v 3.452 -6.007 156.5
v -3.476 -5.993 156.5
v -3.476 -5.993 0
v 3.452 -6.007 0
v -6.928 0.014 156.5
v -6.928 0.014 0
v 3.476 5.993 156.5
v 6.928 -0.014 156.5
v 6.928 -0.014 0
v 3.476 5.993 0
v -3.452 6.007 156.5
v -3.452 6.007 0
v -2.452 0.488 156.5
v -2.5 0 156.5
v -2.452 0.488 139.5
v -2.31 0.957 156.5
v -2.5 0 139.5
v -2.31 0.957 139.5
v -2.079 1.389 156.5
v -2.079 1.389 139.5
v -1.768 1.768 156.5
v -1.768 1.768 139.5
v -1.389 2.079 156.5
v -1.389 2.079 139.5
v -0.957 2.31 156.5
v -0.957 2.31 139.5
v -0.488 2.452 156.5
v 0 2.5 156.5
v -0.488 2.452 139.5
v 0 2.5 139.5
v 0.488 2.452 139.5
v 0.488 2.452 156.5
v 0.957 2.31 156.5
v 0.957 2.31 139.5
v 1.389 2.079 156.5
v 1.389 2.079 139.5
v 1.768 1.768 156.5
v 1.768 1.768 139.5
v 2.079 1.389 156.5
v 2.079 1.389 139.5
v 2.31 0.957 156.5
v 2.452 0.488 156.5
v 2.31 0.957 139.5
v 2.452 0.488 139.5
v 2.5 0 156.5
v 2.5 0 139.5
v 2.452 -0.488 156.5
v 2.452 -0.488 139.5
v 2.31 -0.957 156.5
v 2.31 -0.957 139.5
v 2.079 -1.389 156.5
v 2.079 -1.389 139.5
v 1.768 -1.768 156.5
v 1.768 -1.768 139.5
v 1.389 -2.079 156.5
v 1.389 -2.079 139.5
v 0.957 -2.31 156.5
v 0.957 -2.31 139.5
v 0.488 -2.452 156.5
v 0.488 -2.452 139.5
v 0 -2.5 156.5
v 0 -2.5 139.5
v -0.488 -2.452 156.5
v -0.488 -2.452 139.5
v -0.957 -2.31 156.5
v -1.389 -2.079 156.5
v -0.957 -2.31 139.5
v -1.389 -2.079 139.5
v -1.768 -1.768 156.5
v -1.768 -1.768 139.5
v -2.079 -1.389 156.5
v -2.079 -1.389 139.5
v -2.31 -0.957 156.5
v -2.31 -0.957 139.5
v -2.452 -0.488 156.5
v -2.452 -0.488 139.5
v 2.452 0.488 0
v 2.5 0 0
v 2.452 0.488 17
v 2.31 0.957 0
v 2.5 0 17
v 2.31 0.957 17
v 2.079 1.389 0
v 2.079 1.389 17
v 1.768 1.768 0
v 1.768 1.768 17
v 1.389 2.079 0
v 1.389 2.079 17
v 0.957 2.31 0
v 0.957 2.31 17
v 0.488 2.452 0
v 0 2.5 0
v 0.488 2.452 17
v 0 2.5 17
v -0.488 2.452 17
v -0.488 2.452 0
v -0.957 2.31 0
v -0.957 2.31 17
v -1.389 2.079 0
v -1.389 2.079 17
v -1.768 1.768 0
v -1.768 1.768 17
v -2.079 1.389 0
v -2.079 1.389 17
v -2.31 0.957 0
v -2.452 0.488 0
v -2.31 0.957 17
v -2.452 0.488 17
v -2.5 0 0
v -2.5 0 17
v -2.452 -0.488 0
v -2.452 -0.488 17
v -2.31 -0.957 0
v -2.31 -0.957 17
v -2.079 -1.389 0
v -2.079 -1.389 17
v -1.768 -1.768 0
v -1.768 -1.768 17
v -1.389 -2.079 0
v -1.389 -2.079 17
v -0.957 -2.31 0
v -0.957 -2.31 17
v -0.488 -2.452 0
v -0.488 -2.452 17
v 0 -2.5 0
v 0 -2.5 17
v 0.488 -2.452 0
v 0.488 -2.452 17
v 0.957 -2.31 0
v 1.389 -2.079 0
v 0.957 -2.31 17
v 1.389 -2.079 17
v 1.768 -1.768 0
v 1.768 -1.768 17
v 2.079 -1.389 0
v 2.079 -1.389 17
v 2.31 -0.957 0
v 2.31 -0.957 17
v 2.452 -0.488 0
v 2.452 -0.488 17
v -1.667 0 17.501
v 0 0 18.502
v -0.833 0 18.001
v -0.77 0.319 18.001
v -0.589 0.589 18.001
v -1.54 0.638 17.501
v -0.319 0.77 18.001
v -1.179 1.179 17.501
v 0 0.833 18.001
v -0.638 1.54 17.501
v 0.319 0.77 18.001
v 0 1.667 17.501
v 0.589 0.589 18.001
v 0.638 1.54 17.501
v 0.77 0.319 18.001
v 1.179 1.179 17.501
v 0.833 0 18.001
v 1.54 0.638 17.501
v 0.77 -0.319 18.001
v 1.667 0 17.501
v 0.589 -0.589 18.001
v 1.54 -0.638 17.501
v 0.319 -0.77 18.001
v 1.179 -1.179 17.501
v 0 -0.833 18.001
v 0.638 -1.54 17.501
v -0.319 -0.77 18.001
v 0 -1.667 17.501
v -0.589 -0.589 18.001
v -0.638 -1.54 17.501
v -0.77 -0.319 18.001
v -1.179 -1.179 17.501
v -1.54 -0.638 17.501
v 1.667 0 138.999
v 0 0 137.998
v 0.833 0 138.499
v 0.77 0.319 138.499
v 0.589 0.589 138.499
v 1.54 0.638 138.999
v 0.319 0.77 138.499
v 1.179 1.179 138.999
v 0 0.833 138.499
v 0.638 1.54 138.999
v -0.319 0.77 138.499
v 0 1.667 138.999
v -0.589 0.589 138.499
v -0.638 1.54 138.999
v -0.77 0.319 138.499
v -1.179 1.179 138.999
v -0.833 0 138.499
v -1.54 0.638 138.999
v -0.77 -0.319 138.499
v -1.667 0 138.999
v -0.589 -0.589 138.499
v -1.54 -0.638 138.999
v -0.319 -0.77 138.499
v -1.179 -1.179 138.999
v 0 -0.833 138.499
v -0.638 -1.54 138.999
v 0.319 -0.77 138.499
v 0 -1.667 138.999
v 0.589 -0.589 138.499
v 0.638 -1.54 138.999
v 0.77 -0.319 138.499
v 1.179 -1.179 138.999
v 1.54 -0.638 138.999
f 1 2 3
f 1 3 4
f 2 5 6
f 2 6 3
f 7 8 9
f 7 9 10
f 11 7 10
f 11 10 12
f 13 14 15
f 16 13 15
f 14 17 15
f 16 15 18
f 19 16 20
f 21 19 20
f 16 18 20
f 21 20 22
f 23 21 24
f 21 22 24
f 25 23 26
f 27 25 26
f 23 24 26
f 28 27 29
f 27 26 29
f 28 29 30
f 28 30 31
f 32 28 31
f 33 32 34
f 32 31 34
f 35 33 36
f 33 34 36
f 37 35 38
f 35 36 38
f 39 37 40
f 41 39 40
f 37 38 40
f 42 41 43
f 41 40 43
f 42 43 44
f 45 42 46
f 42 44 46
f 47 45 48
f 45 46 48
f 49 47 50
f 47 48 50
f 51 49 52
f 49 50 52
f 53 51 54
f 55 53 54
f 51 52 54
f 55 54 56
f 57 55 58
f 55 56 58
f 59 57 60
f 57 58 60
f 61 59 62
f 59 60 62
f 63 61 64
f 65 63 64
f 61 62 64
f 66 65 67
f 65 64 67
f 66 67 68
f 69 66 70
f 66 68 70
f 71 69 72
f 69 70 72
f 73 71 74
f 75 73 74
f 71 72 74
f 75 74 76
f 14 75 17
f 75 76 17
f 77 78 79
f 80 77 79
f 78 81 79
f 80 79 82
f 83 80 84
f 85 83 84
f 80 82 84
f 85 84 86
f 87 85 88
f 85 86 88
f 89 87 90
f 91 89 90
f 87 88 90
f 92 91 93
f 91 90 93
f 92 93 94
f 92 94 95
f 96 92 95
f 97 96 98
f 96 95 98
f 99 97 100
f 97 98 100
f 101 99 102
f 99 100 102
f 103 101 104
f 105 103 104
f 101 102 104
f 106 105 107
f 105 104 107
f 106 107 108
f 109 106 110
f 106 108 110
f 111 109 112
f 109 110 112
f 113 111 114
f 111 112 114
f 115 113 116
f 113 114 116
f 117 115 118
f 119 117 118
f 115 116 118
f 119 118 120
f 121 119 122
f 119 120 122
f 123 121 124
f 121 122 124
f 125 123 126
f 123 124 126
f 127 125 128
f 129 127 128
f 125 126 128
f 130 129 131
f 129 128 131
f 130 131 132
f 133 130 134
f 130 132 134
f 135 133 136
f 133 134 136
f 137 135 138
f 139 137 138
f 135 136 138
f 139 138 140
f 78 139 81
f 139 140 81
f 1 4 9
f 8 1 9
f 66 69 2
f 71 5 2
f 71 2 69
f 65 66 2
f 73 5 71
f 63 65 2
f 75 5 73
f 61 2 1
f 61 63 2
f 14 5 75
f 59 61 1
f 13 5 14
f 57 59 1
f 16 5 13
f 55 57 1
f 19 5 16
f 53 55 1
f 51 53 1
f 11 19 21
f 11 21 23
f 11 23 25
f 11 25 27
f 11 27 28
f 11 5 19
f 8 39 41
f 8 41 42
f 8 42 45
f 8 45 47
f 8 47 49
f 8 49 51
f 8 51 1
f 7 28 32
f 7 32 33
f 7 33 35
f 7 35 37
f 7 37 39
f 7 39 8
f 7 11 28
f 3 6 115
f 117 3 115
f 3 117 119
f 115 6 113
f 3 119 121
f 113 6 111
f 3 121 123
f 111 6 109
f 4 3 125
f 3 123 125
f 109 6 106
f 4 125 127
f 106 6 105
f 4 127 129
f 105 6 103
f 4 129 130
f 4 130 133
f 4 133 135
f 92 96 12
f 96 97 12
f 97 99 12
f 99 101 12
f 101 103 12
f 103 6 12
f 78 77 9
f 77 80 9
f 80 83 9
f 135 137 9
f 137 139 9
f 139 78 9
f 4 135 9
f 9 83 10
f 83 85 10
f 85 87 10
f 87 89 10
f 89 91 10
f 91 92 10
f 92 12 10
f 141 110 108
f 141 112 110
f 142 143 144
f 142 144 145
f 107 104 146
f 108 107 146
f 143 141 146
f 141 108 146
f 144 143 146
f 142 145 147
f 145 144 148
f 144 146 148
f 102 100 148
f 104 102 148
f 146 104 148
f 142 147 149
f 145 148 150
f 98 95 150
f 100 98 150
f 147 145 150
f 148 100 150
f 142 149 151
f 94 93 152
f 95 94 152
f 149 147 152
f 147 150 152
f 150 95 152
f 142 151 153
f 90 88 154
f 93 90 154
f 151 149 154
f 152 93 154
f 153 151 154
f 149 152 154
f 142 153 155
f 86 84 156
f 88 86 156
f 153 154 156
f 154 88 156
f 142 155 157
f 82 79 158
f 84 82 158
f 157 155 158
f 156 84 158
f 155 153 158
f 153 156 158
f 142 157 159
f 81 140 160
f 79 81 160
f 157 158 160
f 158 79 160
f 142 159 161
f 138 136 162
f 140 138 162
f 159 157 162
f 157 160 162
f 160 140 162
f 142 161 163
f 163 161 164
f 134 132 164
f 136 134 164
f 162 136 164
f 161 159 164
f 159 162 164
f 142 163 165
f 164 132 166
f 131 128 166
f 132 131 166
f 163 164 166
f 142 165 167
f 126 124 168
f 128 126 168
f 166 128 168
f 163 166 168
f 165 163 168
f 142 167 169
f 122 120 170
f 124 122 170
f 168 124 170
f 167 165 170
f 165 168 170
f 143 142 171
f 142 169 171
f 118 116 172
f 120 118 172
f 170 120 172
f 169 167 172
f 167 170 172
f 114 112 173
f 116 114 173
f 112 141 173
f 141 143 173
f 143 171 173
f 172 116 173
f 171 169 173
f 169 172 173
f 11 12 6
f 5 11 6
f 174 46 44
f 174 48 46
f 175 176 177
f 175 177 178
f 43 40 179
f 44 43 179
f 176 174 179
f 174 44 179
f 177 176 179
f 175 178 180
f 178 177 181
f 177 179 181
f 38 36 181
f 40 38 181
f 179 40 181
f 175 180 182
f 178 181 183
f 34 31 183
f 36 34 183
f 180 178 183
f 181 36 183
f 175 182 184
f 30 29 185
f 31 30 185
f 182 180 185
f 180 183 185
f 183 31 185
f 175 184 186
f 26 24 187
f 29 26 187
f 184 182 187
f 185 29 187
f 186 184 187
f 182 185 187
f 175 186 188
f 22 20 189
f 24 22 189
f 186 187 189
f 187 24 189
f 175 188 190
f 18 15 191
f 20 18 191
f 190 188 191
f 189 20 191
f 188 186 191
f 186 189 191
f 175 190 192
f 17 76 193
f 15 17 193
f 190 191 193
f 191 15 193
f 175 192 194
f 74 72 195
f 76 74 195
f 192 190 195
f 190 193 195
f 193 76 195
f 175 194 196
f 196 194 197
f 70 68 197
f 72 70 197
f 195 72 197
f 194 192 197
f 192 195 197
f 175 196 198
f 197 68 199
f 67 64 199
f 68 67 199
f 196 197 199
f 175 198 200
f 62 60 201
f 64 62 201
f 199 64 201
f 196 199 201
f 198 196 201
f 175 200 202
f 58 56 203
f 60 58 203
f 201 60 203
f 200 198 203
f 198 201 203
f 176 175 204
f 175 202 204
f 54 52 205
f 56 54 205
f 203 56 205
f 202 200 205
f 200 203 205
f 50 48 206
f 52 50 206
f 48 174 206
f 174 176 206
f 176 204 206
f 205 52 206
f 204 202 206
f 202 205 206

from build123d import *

# Parameters (mm, degrees)
BOSS_EXTRUDE1_DEPTH       = 156.5
M6X1_0_TAPPED_HOLE1_D     = 5
M6X1_0_TAPPED_HOLE1_DEPTH = 17
M6X1_0_TAPPED_HOLE1_TIP   = 1.502151548
M6X1_0_TAPPED_HOLE2_D     = 5
M6X1_0_TAPPED_HOLE2_DEPTH = 17
M6X1_0_TAPPED_HOLE2_TIP   = 1.502151548


with BuildPart() as part:
    # Sketch1 → Boss-Extrude1 (new body)
    with BuildSketch(Plane.XY):
        Polygon((3.452384384, -6.006749709), (6.928190034, -0.013522274), (3.47580565, 5.993227435), (-3.452384384, 6.006749709), (-6.928190034, 0.013522274), (-3.47580565, -5.993227435), align=None)
    extrude(amount=BOSS_EXTRUDE1_DEPTH)

    # M6x1.0 Tapped Hole1
    with Locations(Plane.XY.offset(156.5)):
        with Locations((0, 0)):
            Hole(M6X1_0_TAPPED_HOLE1_D / 2, depth=M6X1_0_TAPPED_HOLE1_DEPTH)
            with Locations((0, 0, -(M6X1_0_TAPPED_HOLE1_DEPTH + M6X1_0_TAPPED_HOLE1_TIP / 2))):  # 118° drill point
                Cone(0, M6X1_0_TAPPED_HOLE1_D / 2, M6X1_0_TAPPED_HOLE1_TIP, mode=Mode.SUBTRACT)

    # M6x1.0 Tapped Hole2
    with Locations(Plane(origin=(0, 0, 0), x_dir=(-1, 0, 0), z_dir=(0, 0, -1))):
        with Locations((0, 0)):
            Hole(M6X1_0_TAPPED_HOLE2_D / 2, depth=M6X1_0_TAPPED_HOLE2_DEPTH)
            with Locations((0, 0, -(M6X1_0_TAPPED_HOLE2_DEPTH + M6X1_0_TAPPED_HOLE2_TIP / 2))):  # 118° drill point
                Cone(0, M6X1_0_TAPPED_HOLE2_D / 2, M6X1_0_TAPPED_HOLE2_TIP, mode=Mode.SUBTRACT)


solid = part.part
